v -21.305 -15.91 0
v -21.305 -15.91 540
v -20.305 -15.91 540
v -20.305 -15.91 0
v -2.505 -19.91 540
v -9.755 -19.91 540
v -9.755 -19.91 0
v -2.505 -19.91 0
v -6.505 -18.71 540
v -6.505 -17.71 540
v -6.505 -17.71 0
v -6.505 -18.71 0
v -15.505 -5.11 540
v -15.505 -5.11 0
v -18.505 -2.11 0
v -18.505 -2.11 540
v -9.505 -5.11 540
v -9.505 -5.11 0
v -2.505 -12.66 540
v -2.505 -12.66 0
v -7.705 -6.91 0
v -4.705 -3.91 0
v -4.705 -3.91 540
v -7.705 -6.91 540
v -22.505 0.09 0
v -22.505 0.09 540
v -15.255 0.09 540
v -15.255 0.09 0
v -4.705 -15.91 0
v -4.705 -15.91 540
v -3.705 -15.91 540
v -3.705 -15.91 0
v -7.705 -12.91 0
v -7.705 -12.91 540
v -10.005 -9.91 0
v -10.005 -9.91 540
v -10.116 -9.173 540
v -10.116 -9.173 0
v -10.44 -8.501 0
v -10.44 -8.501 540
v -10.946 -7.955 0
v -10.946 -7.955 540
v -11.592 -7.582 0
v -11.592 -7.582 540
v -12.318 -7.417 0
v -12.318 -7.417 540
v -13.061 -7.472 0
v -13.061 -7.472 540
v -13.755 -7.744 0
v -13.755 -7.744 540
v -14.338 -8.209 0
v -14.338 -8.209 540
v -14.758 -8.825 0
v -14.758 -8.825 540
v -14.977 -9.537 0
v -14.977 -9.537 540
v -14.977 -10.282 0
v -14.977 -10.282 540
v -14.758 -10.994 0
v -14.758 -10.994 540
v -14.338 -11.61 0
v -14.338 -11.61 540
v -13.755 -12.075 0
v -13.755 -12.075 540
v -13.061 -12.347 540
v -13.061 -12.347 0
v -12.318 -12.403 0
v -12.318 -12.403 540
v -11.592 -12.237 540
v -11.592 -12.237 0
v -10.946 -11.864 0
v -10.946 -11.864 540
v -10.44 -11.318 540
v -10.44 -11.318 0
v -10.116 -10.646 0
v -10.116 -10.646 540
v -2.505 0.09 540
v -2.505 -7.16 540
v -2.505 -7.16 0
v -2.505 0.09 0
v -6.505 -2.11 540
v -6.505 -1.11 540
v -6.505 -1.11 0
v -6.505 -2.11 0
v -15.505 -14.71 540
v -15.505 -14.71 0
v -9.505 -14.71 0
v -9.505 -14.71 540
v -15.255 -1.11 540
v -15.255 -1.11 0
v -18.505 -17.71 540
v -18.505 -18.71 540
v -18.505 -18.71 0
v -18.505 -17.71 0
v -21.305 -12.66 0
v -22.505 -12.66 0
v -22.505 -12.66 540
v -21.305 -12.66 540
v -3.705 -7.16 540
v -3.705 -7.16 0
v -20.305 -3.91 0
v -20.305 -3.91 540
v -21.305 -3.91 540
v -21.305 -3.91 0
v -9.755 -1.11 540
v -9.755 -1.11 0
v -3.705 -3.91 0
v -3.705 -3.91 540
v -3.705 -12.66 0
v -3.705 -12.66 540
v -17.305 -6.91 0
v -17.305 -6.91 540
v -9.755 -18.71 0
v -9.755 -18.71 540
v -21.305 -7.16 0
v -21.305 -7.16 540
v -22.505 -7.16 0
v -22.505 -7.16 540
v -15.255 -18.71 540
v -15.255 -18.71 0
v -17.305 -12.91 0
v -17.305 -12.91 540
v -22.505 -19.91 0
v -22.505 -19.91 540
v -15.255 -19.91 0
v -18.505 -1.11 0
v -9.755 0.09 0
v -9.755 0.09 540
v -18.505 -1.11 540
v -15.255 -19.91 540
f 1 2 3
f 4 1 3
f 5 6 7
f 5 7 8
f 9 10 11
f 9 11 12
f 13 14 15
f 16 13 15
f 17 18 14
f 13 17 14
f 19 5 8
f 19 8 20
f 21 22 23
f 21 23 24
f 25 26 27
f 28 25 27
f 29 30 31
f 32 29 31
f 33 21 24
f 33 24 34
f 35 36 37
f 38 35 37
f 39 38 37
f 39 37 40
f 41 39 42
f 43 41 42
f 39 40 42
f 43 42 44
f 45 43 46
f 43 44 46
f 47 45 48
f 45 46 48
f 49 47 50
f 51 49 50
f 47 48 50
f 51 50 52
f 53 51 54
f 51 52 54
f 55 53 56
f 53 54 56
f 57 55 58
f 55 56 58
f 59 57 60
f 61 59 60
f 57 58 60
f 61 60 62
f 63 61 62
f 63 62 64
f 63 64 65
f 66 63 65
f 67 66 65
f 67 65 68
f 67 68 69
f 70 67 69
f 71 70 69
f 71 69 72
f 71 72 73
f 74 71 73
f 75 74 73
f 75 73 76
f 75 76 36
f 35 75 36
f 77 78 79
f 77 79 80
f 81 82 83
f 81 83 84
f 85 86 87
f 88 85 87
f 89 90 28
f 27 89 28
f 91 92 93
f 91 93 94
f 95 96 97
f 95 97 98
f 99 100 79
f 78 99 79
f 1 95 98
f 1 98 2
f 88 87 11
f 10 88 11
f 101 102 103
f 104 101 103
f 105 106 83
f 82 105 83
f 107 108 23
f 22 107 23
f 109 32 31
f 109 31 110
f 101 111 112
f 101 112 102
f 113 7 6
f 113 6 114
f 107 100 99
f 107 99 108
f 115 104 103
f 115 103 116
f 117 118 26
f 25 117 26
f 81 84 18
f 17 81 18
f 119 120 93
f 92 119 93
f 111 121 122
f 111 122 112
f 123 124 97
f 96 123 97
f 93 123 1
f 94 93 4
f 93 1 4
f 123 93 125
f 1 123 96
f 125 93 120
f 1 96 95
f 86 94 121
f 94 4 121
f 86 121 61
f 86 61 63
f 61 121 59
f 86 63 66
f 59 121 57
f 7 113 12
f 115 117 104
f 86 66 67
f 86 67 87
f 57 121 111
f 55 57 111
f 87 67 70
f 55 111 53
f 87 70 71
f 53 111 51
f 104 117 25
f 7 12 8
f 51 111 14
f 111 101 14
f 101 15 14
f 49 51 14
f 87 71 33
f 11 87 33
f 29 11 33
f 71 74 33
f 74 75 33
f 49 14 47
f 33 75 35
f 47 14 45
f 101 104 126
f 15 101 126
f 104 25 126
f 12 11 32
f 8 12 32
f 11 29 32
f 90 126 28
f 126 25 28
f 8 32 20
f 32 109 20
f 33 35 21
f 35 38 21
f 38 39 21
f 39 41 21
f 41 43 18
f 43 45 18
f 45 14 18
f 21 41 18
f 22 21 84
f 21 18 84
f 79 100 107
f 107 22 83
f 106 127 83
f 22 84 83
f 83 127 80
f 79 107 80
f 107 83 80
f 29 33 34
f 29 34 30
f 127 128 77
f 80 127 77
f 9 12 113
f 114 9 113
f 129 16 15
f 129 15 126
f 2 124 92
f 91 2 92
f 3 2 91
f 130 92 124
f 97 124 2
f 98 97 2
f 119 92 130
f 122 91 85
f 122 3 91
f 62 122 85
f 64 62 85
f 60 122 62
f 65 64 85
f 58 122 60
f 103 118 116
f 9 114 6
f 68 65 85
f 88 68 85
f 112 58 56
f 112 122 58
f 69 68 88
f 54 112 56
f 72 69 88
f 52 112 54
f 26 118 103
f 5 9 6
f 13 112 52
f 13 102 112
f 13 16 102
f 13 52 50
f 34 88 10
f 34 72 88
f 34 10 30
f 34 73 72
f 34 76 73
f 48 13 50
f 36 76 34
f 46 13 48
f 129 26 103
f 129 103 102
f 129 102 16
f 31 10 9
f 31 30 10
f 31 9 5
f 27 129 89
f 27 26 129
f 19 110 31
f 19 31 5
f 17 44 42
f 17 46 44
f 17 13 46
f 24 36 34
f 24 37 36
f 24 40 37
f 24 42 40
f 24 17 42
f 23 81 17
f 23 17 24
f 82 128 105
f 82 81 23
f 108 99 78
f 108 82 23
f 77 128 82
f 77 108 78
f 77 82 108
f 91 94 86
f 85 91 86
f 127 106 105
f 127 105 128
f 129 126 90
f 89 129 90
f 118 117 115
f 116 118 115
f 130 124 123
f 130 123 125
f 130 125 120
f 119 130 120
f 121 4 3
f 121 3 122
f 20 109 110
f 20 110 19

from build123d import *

# Parameters (mm, degrees)
ESQUISSE1_W             = 20
ESQUISSE1_H             = 20
BOSS_EXTRU_1_DEPTH      = 540
ESQUISSE2_W             = 1.2
ESQUISSE2_H             = 5.5
ESQUISSE2_W_2           = 5.5
ESQUISSE2_H_2           = 1.2
ENL_V_MAT_EXTRU_1_DEPTH = 541
ENL_V_MAT_EXTRU_2_DEPTH = 541
ESQUISSE4_R             = 2.5
ENL_V_MAT_EXTRU_3_DEPTH = 541


with BuildPart() as part:
    # Esquisse1 → Boss.-Extru.1 (new body)
    with BuildSketch(Plane.XY):
        with Locations((-12.505109137, -9.909560068)):
            Rectangle(ESQUISSE1_W, ESQUISSE1_H)
    extrude(amount=BOSS_EXTRU_1_DEPTH)

    # Esquisse2 → Enlèv. mat.-Extru.1 (cut, through all)
    with BuildSketch(Plane.XY.offset(540)):
        with Locations((-21.905109137, -9.909560068)):
            Rectangle(ESQUISSE2_W, ESQUISSE2_H)
        with Locations((-12.505109137, -0.509560068)):
            Rectangle(ESQUISSE2_W_2, ESQUISSE2_H_2)
        with Locations((-3.105109137, -9.909560068)):
            Rectangle(ESQUISSE2_W, ESQUISSE2_H)
        with Locations((-12.505109137, -19.309560068)):
            Rectangle(ESQUISSE2_W_2, ESQUISSE2_H_2)
    extrude(amount=-ENL_V_MAT_EXTRU_1_DEPTH, mode=Mode.SUBTRACT)

    # Esquisse3 → Enlèv. mat.-Extru.2 (cut, through all)
    with BuildSketch(Plane.XY.offset(540)):
        Polygon((-21.305109137, -15.909560068), (-20.305109137, -15.909560068), (-17.305109137, -12.909560068), (-17.305109137, -6.909560068), (-20.305109137, -3.909560068), (-21.305109137, -3.909560068), align=None)
        Polygon((-18.505109137, -1.109560068), (-6.505109137, -1.109560068), (-6.505109137, -2.109560068), (-9.505109137, -5.109560068), (-15.505109137, -5.109560068), (-18.505109137, -2.109560068), align=None)
        Polygon((-3.705109137, -3.909560068), (-4.705109137, -3.909560068), (-7.705109137, -6.909560068), (-7.705109137, -12.909560068), (-4.705109137, -15.909560068), (-3.705109137, -15.909560068), align=None)
        Polygon((-6.505109137, -18.709560068), (-18.505109137, -18.709560068), (-18.505109137, -17.709560068), (-15.505109137, -14.709560068), (-9.505109137, -14.709560068), (-6.505109137, -17.709560068), align=None)
    extrude(amount=-ENL_V_MAT_EXTRU_2_DEPTH, mode=Mode.SUBTRACT)

    # Esquisse4 → Enlèv. mat.-Extru.3 (cut, through all)
    with BuildSketch(Plane.XY.offset(540)):
        with Locations((-12.505109137, -9.909560068)):
            Circle(ESQUISSE4_R)
    extrude(amount=-ENL_V_MAT_EXTRU_3_DEPTH, mode=Mode.SUBTRACT)


solid = part.part
